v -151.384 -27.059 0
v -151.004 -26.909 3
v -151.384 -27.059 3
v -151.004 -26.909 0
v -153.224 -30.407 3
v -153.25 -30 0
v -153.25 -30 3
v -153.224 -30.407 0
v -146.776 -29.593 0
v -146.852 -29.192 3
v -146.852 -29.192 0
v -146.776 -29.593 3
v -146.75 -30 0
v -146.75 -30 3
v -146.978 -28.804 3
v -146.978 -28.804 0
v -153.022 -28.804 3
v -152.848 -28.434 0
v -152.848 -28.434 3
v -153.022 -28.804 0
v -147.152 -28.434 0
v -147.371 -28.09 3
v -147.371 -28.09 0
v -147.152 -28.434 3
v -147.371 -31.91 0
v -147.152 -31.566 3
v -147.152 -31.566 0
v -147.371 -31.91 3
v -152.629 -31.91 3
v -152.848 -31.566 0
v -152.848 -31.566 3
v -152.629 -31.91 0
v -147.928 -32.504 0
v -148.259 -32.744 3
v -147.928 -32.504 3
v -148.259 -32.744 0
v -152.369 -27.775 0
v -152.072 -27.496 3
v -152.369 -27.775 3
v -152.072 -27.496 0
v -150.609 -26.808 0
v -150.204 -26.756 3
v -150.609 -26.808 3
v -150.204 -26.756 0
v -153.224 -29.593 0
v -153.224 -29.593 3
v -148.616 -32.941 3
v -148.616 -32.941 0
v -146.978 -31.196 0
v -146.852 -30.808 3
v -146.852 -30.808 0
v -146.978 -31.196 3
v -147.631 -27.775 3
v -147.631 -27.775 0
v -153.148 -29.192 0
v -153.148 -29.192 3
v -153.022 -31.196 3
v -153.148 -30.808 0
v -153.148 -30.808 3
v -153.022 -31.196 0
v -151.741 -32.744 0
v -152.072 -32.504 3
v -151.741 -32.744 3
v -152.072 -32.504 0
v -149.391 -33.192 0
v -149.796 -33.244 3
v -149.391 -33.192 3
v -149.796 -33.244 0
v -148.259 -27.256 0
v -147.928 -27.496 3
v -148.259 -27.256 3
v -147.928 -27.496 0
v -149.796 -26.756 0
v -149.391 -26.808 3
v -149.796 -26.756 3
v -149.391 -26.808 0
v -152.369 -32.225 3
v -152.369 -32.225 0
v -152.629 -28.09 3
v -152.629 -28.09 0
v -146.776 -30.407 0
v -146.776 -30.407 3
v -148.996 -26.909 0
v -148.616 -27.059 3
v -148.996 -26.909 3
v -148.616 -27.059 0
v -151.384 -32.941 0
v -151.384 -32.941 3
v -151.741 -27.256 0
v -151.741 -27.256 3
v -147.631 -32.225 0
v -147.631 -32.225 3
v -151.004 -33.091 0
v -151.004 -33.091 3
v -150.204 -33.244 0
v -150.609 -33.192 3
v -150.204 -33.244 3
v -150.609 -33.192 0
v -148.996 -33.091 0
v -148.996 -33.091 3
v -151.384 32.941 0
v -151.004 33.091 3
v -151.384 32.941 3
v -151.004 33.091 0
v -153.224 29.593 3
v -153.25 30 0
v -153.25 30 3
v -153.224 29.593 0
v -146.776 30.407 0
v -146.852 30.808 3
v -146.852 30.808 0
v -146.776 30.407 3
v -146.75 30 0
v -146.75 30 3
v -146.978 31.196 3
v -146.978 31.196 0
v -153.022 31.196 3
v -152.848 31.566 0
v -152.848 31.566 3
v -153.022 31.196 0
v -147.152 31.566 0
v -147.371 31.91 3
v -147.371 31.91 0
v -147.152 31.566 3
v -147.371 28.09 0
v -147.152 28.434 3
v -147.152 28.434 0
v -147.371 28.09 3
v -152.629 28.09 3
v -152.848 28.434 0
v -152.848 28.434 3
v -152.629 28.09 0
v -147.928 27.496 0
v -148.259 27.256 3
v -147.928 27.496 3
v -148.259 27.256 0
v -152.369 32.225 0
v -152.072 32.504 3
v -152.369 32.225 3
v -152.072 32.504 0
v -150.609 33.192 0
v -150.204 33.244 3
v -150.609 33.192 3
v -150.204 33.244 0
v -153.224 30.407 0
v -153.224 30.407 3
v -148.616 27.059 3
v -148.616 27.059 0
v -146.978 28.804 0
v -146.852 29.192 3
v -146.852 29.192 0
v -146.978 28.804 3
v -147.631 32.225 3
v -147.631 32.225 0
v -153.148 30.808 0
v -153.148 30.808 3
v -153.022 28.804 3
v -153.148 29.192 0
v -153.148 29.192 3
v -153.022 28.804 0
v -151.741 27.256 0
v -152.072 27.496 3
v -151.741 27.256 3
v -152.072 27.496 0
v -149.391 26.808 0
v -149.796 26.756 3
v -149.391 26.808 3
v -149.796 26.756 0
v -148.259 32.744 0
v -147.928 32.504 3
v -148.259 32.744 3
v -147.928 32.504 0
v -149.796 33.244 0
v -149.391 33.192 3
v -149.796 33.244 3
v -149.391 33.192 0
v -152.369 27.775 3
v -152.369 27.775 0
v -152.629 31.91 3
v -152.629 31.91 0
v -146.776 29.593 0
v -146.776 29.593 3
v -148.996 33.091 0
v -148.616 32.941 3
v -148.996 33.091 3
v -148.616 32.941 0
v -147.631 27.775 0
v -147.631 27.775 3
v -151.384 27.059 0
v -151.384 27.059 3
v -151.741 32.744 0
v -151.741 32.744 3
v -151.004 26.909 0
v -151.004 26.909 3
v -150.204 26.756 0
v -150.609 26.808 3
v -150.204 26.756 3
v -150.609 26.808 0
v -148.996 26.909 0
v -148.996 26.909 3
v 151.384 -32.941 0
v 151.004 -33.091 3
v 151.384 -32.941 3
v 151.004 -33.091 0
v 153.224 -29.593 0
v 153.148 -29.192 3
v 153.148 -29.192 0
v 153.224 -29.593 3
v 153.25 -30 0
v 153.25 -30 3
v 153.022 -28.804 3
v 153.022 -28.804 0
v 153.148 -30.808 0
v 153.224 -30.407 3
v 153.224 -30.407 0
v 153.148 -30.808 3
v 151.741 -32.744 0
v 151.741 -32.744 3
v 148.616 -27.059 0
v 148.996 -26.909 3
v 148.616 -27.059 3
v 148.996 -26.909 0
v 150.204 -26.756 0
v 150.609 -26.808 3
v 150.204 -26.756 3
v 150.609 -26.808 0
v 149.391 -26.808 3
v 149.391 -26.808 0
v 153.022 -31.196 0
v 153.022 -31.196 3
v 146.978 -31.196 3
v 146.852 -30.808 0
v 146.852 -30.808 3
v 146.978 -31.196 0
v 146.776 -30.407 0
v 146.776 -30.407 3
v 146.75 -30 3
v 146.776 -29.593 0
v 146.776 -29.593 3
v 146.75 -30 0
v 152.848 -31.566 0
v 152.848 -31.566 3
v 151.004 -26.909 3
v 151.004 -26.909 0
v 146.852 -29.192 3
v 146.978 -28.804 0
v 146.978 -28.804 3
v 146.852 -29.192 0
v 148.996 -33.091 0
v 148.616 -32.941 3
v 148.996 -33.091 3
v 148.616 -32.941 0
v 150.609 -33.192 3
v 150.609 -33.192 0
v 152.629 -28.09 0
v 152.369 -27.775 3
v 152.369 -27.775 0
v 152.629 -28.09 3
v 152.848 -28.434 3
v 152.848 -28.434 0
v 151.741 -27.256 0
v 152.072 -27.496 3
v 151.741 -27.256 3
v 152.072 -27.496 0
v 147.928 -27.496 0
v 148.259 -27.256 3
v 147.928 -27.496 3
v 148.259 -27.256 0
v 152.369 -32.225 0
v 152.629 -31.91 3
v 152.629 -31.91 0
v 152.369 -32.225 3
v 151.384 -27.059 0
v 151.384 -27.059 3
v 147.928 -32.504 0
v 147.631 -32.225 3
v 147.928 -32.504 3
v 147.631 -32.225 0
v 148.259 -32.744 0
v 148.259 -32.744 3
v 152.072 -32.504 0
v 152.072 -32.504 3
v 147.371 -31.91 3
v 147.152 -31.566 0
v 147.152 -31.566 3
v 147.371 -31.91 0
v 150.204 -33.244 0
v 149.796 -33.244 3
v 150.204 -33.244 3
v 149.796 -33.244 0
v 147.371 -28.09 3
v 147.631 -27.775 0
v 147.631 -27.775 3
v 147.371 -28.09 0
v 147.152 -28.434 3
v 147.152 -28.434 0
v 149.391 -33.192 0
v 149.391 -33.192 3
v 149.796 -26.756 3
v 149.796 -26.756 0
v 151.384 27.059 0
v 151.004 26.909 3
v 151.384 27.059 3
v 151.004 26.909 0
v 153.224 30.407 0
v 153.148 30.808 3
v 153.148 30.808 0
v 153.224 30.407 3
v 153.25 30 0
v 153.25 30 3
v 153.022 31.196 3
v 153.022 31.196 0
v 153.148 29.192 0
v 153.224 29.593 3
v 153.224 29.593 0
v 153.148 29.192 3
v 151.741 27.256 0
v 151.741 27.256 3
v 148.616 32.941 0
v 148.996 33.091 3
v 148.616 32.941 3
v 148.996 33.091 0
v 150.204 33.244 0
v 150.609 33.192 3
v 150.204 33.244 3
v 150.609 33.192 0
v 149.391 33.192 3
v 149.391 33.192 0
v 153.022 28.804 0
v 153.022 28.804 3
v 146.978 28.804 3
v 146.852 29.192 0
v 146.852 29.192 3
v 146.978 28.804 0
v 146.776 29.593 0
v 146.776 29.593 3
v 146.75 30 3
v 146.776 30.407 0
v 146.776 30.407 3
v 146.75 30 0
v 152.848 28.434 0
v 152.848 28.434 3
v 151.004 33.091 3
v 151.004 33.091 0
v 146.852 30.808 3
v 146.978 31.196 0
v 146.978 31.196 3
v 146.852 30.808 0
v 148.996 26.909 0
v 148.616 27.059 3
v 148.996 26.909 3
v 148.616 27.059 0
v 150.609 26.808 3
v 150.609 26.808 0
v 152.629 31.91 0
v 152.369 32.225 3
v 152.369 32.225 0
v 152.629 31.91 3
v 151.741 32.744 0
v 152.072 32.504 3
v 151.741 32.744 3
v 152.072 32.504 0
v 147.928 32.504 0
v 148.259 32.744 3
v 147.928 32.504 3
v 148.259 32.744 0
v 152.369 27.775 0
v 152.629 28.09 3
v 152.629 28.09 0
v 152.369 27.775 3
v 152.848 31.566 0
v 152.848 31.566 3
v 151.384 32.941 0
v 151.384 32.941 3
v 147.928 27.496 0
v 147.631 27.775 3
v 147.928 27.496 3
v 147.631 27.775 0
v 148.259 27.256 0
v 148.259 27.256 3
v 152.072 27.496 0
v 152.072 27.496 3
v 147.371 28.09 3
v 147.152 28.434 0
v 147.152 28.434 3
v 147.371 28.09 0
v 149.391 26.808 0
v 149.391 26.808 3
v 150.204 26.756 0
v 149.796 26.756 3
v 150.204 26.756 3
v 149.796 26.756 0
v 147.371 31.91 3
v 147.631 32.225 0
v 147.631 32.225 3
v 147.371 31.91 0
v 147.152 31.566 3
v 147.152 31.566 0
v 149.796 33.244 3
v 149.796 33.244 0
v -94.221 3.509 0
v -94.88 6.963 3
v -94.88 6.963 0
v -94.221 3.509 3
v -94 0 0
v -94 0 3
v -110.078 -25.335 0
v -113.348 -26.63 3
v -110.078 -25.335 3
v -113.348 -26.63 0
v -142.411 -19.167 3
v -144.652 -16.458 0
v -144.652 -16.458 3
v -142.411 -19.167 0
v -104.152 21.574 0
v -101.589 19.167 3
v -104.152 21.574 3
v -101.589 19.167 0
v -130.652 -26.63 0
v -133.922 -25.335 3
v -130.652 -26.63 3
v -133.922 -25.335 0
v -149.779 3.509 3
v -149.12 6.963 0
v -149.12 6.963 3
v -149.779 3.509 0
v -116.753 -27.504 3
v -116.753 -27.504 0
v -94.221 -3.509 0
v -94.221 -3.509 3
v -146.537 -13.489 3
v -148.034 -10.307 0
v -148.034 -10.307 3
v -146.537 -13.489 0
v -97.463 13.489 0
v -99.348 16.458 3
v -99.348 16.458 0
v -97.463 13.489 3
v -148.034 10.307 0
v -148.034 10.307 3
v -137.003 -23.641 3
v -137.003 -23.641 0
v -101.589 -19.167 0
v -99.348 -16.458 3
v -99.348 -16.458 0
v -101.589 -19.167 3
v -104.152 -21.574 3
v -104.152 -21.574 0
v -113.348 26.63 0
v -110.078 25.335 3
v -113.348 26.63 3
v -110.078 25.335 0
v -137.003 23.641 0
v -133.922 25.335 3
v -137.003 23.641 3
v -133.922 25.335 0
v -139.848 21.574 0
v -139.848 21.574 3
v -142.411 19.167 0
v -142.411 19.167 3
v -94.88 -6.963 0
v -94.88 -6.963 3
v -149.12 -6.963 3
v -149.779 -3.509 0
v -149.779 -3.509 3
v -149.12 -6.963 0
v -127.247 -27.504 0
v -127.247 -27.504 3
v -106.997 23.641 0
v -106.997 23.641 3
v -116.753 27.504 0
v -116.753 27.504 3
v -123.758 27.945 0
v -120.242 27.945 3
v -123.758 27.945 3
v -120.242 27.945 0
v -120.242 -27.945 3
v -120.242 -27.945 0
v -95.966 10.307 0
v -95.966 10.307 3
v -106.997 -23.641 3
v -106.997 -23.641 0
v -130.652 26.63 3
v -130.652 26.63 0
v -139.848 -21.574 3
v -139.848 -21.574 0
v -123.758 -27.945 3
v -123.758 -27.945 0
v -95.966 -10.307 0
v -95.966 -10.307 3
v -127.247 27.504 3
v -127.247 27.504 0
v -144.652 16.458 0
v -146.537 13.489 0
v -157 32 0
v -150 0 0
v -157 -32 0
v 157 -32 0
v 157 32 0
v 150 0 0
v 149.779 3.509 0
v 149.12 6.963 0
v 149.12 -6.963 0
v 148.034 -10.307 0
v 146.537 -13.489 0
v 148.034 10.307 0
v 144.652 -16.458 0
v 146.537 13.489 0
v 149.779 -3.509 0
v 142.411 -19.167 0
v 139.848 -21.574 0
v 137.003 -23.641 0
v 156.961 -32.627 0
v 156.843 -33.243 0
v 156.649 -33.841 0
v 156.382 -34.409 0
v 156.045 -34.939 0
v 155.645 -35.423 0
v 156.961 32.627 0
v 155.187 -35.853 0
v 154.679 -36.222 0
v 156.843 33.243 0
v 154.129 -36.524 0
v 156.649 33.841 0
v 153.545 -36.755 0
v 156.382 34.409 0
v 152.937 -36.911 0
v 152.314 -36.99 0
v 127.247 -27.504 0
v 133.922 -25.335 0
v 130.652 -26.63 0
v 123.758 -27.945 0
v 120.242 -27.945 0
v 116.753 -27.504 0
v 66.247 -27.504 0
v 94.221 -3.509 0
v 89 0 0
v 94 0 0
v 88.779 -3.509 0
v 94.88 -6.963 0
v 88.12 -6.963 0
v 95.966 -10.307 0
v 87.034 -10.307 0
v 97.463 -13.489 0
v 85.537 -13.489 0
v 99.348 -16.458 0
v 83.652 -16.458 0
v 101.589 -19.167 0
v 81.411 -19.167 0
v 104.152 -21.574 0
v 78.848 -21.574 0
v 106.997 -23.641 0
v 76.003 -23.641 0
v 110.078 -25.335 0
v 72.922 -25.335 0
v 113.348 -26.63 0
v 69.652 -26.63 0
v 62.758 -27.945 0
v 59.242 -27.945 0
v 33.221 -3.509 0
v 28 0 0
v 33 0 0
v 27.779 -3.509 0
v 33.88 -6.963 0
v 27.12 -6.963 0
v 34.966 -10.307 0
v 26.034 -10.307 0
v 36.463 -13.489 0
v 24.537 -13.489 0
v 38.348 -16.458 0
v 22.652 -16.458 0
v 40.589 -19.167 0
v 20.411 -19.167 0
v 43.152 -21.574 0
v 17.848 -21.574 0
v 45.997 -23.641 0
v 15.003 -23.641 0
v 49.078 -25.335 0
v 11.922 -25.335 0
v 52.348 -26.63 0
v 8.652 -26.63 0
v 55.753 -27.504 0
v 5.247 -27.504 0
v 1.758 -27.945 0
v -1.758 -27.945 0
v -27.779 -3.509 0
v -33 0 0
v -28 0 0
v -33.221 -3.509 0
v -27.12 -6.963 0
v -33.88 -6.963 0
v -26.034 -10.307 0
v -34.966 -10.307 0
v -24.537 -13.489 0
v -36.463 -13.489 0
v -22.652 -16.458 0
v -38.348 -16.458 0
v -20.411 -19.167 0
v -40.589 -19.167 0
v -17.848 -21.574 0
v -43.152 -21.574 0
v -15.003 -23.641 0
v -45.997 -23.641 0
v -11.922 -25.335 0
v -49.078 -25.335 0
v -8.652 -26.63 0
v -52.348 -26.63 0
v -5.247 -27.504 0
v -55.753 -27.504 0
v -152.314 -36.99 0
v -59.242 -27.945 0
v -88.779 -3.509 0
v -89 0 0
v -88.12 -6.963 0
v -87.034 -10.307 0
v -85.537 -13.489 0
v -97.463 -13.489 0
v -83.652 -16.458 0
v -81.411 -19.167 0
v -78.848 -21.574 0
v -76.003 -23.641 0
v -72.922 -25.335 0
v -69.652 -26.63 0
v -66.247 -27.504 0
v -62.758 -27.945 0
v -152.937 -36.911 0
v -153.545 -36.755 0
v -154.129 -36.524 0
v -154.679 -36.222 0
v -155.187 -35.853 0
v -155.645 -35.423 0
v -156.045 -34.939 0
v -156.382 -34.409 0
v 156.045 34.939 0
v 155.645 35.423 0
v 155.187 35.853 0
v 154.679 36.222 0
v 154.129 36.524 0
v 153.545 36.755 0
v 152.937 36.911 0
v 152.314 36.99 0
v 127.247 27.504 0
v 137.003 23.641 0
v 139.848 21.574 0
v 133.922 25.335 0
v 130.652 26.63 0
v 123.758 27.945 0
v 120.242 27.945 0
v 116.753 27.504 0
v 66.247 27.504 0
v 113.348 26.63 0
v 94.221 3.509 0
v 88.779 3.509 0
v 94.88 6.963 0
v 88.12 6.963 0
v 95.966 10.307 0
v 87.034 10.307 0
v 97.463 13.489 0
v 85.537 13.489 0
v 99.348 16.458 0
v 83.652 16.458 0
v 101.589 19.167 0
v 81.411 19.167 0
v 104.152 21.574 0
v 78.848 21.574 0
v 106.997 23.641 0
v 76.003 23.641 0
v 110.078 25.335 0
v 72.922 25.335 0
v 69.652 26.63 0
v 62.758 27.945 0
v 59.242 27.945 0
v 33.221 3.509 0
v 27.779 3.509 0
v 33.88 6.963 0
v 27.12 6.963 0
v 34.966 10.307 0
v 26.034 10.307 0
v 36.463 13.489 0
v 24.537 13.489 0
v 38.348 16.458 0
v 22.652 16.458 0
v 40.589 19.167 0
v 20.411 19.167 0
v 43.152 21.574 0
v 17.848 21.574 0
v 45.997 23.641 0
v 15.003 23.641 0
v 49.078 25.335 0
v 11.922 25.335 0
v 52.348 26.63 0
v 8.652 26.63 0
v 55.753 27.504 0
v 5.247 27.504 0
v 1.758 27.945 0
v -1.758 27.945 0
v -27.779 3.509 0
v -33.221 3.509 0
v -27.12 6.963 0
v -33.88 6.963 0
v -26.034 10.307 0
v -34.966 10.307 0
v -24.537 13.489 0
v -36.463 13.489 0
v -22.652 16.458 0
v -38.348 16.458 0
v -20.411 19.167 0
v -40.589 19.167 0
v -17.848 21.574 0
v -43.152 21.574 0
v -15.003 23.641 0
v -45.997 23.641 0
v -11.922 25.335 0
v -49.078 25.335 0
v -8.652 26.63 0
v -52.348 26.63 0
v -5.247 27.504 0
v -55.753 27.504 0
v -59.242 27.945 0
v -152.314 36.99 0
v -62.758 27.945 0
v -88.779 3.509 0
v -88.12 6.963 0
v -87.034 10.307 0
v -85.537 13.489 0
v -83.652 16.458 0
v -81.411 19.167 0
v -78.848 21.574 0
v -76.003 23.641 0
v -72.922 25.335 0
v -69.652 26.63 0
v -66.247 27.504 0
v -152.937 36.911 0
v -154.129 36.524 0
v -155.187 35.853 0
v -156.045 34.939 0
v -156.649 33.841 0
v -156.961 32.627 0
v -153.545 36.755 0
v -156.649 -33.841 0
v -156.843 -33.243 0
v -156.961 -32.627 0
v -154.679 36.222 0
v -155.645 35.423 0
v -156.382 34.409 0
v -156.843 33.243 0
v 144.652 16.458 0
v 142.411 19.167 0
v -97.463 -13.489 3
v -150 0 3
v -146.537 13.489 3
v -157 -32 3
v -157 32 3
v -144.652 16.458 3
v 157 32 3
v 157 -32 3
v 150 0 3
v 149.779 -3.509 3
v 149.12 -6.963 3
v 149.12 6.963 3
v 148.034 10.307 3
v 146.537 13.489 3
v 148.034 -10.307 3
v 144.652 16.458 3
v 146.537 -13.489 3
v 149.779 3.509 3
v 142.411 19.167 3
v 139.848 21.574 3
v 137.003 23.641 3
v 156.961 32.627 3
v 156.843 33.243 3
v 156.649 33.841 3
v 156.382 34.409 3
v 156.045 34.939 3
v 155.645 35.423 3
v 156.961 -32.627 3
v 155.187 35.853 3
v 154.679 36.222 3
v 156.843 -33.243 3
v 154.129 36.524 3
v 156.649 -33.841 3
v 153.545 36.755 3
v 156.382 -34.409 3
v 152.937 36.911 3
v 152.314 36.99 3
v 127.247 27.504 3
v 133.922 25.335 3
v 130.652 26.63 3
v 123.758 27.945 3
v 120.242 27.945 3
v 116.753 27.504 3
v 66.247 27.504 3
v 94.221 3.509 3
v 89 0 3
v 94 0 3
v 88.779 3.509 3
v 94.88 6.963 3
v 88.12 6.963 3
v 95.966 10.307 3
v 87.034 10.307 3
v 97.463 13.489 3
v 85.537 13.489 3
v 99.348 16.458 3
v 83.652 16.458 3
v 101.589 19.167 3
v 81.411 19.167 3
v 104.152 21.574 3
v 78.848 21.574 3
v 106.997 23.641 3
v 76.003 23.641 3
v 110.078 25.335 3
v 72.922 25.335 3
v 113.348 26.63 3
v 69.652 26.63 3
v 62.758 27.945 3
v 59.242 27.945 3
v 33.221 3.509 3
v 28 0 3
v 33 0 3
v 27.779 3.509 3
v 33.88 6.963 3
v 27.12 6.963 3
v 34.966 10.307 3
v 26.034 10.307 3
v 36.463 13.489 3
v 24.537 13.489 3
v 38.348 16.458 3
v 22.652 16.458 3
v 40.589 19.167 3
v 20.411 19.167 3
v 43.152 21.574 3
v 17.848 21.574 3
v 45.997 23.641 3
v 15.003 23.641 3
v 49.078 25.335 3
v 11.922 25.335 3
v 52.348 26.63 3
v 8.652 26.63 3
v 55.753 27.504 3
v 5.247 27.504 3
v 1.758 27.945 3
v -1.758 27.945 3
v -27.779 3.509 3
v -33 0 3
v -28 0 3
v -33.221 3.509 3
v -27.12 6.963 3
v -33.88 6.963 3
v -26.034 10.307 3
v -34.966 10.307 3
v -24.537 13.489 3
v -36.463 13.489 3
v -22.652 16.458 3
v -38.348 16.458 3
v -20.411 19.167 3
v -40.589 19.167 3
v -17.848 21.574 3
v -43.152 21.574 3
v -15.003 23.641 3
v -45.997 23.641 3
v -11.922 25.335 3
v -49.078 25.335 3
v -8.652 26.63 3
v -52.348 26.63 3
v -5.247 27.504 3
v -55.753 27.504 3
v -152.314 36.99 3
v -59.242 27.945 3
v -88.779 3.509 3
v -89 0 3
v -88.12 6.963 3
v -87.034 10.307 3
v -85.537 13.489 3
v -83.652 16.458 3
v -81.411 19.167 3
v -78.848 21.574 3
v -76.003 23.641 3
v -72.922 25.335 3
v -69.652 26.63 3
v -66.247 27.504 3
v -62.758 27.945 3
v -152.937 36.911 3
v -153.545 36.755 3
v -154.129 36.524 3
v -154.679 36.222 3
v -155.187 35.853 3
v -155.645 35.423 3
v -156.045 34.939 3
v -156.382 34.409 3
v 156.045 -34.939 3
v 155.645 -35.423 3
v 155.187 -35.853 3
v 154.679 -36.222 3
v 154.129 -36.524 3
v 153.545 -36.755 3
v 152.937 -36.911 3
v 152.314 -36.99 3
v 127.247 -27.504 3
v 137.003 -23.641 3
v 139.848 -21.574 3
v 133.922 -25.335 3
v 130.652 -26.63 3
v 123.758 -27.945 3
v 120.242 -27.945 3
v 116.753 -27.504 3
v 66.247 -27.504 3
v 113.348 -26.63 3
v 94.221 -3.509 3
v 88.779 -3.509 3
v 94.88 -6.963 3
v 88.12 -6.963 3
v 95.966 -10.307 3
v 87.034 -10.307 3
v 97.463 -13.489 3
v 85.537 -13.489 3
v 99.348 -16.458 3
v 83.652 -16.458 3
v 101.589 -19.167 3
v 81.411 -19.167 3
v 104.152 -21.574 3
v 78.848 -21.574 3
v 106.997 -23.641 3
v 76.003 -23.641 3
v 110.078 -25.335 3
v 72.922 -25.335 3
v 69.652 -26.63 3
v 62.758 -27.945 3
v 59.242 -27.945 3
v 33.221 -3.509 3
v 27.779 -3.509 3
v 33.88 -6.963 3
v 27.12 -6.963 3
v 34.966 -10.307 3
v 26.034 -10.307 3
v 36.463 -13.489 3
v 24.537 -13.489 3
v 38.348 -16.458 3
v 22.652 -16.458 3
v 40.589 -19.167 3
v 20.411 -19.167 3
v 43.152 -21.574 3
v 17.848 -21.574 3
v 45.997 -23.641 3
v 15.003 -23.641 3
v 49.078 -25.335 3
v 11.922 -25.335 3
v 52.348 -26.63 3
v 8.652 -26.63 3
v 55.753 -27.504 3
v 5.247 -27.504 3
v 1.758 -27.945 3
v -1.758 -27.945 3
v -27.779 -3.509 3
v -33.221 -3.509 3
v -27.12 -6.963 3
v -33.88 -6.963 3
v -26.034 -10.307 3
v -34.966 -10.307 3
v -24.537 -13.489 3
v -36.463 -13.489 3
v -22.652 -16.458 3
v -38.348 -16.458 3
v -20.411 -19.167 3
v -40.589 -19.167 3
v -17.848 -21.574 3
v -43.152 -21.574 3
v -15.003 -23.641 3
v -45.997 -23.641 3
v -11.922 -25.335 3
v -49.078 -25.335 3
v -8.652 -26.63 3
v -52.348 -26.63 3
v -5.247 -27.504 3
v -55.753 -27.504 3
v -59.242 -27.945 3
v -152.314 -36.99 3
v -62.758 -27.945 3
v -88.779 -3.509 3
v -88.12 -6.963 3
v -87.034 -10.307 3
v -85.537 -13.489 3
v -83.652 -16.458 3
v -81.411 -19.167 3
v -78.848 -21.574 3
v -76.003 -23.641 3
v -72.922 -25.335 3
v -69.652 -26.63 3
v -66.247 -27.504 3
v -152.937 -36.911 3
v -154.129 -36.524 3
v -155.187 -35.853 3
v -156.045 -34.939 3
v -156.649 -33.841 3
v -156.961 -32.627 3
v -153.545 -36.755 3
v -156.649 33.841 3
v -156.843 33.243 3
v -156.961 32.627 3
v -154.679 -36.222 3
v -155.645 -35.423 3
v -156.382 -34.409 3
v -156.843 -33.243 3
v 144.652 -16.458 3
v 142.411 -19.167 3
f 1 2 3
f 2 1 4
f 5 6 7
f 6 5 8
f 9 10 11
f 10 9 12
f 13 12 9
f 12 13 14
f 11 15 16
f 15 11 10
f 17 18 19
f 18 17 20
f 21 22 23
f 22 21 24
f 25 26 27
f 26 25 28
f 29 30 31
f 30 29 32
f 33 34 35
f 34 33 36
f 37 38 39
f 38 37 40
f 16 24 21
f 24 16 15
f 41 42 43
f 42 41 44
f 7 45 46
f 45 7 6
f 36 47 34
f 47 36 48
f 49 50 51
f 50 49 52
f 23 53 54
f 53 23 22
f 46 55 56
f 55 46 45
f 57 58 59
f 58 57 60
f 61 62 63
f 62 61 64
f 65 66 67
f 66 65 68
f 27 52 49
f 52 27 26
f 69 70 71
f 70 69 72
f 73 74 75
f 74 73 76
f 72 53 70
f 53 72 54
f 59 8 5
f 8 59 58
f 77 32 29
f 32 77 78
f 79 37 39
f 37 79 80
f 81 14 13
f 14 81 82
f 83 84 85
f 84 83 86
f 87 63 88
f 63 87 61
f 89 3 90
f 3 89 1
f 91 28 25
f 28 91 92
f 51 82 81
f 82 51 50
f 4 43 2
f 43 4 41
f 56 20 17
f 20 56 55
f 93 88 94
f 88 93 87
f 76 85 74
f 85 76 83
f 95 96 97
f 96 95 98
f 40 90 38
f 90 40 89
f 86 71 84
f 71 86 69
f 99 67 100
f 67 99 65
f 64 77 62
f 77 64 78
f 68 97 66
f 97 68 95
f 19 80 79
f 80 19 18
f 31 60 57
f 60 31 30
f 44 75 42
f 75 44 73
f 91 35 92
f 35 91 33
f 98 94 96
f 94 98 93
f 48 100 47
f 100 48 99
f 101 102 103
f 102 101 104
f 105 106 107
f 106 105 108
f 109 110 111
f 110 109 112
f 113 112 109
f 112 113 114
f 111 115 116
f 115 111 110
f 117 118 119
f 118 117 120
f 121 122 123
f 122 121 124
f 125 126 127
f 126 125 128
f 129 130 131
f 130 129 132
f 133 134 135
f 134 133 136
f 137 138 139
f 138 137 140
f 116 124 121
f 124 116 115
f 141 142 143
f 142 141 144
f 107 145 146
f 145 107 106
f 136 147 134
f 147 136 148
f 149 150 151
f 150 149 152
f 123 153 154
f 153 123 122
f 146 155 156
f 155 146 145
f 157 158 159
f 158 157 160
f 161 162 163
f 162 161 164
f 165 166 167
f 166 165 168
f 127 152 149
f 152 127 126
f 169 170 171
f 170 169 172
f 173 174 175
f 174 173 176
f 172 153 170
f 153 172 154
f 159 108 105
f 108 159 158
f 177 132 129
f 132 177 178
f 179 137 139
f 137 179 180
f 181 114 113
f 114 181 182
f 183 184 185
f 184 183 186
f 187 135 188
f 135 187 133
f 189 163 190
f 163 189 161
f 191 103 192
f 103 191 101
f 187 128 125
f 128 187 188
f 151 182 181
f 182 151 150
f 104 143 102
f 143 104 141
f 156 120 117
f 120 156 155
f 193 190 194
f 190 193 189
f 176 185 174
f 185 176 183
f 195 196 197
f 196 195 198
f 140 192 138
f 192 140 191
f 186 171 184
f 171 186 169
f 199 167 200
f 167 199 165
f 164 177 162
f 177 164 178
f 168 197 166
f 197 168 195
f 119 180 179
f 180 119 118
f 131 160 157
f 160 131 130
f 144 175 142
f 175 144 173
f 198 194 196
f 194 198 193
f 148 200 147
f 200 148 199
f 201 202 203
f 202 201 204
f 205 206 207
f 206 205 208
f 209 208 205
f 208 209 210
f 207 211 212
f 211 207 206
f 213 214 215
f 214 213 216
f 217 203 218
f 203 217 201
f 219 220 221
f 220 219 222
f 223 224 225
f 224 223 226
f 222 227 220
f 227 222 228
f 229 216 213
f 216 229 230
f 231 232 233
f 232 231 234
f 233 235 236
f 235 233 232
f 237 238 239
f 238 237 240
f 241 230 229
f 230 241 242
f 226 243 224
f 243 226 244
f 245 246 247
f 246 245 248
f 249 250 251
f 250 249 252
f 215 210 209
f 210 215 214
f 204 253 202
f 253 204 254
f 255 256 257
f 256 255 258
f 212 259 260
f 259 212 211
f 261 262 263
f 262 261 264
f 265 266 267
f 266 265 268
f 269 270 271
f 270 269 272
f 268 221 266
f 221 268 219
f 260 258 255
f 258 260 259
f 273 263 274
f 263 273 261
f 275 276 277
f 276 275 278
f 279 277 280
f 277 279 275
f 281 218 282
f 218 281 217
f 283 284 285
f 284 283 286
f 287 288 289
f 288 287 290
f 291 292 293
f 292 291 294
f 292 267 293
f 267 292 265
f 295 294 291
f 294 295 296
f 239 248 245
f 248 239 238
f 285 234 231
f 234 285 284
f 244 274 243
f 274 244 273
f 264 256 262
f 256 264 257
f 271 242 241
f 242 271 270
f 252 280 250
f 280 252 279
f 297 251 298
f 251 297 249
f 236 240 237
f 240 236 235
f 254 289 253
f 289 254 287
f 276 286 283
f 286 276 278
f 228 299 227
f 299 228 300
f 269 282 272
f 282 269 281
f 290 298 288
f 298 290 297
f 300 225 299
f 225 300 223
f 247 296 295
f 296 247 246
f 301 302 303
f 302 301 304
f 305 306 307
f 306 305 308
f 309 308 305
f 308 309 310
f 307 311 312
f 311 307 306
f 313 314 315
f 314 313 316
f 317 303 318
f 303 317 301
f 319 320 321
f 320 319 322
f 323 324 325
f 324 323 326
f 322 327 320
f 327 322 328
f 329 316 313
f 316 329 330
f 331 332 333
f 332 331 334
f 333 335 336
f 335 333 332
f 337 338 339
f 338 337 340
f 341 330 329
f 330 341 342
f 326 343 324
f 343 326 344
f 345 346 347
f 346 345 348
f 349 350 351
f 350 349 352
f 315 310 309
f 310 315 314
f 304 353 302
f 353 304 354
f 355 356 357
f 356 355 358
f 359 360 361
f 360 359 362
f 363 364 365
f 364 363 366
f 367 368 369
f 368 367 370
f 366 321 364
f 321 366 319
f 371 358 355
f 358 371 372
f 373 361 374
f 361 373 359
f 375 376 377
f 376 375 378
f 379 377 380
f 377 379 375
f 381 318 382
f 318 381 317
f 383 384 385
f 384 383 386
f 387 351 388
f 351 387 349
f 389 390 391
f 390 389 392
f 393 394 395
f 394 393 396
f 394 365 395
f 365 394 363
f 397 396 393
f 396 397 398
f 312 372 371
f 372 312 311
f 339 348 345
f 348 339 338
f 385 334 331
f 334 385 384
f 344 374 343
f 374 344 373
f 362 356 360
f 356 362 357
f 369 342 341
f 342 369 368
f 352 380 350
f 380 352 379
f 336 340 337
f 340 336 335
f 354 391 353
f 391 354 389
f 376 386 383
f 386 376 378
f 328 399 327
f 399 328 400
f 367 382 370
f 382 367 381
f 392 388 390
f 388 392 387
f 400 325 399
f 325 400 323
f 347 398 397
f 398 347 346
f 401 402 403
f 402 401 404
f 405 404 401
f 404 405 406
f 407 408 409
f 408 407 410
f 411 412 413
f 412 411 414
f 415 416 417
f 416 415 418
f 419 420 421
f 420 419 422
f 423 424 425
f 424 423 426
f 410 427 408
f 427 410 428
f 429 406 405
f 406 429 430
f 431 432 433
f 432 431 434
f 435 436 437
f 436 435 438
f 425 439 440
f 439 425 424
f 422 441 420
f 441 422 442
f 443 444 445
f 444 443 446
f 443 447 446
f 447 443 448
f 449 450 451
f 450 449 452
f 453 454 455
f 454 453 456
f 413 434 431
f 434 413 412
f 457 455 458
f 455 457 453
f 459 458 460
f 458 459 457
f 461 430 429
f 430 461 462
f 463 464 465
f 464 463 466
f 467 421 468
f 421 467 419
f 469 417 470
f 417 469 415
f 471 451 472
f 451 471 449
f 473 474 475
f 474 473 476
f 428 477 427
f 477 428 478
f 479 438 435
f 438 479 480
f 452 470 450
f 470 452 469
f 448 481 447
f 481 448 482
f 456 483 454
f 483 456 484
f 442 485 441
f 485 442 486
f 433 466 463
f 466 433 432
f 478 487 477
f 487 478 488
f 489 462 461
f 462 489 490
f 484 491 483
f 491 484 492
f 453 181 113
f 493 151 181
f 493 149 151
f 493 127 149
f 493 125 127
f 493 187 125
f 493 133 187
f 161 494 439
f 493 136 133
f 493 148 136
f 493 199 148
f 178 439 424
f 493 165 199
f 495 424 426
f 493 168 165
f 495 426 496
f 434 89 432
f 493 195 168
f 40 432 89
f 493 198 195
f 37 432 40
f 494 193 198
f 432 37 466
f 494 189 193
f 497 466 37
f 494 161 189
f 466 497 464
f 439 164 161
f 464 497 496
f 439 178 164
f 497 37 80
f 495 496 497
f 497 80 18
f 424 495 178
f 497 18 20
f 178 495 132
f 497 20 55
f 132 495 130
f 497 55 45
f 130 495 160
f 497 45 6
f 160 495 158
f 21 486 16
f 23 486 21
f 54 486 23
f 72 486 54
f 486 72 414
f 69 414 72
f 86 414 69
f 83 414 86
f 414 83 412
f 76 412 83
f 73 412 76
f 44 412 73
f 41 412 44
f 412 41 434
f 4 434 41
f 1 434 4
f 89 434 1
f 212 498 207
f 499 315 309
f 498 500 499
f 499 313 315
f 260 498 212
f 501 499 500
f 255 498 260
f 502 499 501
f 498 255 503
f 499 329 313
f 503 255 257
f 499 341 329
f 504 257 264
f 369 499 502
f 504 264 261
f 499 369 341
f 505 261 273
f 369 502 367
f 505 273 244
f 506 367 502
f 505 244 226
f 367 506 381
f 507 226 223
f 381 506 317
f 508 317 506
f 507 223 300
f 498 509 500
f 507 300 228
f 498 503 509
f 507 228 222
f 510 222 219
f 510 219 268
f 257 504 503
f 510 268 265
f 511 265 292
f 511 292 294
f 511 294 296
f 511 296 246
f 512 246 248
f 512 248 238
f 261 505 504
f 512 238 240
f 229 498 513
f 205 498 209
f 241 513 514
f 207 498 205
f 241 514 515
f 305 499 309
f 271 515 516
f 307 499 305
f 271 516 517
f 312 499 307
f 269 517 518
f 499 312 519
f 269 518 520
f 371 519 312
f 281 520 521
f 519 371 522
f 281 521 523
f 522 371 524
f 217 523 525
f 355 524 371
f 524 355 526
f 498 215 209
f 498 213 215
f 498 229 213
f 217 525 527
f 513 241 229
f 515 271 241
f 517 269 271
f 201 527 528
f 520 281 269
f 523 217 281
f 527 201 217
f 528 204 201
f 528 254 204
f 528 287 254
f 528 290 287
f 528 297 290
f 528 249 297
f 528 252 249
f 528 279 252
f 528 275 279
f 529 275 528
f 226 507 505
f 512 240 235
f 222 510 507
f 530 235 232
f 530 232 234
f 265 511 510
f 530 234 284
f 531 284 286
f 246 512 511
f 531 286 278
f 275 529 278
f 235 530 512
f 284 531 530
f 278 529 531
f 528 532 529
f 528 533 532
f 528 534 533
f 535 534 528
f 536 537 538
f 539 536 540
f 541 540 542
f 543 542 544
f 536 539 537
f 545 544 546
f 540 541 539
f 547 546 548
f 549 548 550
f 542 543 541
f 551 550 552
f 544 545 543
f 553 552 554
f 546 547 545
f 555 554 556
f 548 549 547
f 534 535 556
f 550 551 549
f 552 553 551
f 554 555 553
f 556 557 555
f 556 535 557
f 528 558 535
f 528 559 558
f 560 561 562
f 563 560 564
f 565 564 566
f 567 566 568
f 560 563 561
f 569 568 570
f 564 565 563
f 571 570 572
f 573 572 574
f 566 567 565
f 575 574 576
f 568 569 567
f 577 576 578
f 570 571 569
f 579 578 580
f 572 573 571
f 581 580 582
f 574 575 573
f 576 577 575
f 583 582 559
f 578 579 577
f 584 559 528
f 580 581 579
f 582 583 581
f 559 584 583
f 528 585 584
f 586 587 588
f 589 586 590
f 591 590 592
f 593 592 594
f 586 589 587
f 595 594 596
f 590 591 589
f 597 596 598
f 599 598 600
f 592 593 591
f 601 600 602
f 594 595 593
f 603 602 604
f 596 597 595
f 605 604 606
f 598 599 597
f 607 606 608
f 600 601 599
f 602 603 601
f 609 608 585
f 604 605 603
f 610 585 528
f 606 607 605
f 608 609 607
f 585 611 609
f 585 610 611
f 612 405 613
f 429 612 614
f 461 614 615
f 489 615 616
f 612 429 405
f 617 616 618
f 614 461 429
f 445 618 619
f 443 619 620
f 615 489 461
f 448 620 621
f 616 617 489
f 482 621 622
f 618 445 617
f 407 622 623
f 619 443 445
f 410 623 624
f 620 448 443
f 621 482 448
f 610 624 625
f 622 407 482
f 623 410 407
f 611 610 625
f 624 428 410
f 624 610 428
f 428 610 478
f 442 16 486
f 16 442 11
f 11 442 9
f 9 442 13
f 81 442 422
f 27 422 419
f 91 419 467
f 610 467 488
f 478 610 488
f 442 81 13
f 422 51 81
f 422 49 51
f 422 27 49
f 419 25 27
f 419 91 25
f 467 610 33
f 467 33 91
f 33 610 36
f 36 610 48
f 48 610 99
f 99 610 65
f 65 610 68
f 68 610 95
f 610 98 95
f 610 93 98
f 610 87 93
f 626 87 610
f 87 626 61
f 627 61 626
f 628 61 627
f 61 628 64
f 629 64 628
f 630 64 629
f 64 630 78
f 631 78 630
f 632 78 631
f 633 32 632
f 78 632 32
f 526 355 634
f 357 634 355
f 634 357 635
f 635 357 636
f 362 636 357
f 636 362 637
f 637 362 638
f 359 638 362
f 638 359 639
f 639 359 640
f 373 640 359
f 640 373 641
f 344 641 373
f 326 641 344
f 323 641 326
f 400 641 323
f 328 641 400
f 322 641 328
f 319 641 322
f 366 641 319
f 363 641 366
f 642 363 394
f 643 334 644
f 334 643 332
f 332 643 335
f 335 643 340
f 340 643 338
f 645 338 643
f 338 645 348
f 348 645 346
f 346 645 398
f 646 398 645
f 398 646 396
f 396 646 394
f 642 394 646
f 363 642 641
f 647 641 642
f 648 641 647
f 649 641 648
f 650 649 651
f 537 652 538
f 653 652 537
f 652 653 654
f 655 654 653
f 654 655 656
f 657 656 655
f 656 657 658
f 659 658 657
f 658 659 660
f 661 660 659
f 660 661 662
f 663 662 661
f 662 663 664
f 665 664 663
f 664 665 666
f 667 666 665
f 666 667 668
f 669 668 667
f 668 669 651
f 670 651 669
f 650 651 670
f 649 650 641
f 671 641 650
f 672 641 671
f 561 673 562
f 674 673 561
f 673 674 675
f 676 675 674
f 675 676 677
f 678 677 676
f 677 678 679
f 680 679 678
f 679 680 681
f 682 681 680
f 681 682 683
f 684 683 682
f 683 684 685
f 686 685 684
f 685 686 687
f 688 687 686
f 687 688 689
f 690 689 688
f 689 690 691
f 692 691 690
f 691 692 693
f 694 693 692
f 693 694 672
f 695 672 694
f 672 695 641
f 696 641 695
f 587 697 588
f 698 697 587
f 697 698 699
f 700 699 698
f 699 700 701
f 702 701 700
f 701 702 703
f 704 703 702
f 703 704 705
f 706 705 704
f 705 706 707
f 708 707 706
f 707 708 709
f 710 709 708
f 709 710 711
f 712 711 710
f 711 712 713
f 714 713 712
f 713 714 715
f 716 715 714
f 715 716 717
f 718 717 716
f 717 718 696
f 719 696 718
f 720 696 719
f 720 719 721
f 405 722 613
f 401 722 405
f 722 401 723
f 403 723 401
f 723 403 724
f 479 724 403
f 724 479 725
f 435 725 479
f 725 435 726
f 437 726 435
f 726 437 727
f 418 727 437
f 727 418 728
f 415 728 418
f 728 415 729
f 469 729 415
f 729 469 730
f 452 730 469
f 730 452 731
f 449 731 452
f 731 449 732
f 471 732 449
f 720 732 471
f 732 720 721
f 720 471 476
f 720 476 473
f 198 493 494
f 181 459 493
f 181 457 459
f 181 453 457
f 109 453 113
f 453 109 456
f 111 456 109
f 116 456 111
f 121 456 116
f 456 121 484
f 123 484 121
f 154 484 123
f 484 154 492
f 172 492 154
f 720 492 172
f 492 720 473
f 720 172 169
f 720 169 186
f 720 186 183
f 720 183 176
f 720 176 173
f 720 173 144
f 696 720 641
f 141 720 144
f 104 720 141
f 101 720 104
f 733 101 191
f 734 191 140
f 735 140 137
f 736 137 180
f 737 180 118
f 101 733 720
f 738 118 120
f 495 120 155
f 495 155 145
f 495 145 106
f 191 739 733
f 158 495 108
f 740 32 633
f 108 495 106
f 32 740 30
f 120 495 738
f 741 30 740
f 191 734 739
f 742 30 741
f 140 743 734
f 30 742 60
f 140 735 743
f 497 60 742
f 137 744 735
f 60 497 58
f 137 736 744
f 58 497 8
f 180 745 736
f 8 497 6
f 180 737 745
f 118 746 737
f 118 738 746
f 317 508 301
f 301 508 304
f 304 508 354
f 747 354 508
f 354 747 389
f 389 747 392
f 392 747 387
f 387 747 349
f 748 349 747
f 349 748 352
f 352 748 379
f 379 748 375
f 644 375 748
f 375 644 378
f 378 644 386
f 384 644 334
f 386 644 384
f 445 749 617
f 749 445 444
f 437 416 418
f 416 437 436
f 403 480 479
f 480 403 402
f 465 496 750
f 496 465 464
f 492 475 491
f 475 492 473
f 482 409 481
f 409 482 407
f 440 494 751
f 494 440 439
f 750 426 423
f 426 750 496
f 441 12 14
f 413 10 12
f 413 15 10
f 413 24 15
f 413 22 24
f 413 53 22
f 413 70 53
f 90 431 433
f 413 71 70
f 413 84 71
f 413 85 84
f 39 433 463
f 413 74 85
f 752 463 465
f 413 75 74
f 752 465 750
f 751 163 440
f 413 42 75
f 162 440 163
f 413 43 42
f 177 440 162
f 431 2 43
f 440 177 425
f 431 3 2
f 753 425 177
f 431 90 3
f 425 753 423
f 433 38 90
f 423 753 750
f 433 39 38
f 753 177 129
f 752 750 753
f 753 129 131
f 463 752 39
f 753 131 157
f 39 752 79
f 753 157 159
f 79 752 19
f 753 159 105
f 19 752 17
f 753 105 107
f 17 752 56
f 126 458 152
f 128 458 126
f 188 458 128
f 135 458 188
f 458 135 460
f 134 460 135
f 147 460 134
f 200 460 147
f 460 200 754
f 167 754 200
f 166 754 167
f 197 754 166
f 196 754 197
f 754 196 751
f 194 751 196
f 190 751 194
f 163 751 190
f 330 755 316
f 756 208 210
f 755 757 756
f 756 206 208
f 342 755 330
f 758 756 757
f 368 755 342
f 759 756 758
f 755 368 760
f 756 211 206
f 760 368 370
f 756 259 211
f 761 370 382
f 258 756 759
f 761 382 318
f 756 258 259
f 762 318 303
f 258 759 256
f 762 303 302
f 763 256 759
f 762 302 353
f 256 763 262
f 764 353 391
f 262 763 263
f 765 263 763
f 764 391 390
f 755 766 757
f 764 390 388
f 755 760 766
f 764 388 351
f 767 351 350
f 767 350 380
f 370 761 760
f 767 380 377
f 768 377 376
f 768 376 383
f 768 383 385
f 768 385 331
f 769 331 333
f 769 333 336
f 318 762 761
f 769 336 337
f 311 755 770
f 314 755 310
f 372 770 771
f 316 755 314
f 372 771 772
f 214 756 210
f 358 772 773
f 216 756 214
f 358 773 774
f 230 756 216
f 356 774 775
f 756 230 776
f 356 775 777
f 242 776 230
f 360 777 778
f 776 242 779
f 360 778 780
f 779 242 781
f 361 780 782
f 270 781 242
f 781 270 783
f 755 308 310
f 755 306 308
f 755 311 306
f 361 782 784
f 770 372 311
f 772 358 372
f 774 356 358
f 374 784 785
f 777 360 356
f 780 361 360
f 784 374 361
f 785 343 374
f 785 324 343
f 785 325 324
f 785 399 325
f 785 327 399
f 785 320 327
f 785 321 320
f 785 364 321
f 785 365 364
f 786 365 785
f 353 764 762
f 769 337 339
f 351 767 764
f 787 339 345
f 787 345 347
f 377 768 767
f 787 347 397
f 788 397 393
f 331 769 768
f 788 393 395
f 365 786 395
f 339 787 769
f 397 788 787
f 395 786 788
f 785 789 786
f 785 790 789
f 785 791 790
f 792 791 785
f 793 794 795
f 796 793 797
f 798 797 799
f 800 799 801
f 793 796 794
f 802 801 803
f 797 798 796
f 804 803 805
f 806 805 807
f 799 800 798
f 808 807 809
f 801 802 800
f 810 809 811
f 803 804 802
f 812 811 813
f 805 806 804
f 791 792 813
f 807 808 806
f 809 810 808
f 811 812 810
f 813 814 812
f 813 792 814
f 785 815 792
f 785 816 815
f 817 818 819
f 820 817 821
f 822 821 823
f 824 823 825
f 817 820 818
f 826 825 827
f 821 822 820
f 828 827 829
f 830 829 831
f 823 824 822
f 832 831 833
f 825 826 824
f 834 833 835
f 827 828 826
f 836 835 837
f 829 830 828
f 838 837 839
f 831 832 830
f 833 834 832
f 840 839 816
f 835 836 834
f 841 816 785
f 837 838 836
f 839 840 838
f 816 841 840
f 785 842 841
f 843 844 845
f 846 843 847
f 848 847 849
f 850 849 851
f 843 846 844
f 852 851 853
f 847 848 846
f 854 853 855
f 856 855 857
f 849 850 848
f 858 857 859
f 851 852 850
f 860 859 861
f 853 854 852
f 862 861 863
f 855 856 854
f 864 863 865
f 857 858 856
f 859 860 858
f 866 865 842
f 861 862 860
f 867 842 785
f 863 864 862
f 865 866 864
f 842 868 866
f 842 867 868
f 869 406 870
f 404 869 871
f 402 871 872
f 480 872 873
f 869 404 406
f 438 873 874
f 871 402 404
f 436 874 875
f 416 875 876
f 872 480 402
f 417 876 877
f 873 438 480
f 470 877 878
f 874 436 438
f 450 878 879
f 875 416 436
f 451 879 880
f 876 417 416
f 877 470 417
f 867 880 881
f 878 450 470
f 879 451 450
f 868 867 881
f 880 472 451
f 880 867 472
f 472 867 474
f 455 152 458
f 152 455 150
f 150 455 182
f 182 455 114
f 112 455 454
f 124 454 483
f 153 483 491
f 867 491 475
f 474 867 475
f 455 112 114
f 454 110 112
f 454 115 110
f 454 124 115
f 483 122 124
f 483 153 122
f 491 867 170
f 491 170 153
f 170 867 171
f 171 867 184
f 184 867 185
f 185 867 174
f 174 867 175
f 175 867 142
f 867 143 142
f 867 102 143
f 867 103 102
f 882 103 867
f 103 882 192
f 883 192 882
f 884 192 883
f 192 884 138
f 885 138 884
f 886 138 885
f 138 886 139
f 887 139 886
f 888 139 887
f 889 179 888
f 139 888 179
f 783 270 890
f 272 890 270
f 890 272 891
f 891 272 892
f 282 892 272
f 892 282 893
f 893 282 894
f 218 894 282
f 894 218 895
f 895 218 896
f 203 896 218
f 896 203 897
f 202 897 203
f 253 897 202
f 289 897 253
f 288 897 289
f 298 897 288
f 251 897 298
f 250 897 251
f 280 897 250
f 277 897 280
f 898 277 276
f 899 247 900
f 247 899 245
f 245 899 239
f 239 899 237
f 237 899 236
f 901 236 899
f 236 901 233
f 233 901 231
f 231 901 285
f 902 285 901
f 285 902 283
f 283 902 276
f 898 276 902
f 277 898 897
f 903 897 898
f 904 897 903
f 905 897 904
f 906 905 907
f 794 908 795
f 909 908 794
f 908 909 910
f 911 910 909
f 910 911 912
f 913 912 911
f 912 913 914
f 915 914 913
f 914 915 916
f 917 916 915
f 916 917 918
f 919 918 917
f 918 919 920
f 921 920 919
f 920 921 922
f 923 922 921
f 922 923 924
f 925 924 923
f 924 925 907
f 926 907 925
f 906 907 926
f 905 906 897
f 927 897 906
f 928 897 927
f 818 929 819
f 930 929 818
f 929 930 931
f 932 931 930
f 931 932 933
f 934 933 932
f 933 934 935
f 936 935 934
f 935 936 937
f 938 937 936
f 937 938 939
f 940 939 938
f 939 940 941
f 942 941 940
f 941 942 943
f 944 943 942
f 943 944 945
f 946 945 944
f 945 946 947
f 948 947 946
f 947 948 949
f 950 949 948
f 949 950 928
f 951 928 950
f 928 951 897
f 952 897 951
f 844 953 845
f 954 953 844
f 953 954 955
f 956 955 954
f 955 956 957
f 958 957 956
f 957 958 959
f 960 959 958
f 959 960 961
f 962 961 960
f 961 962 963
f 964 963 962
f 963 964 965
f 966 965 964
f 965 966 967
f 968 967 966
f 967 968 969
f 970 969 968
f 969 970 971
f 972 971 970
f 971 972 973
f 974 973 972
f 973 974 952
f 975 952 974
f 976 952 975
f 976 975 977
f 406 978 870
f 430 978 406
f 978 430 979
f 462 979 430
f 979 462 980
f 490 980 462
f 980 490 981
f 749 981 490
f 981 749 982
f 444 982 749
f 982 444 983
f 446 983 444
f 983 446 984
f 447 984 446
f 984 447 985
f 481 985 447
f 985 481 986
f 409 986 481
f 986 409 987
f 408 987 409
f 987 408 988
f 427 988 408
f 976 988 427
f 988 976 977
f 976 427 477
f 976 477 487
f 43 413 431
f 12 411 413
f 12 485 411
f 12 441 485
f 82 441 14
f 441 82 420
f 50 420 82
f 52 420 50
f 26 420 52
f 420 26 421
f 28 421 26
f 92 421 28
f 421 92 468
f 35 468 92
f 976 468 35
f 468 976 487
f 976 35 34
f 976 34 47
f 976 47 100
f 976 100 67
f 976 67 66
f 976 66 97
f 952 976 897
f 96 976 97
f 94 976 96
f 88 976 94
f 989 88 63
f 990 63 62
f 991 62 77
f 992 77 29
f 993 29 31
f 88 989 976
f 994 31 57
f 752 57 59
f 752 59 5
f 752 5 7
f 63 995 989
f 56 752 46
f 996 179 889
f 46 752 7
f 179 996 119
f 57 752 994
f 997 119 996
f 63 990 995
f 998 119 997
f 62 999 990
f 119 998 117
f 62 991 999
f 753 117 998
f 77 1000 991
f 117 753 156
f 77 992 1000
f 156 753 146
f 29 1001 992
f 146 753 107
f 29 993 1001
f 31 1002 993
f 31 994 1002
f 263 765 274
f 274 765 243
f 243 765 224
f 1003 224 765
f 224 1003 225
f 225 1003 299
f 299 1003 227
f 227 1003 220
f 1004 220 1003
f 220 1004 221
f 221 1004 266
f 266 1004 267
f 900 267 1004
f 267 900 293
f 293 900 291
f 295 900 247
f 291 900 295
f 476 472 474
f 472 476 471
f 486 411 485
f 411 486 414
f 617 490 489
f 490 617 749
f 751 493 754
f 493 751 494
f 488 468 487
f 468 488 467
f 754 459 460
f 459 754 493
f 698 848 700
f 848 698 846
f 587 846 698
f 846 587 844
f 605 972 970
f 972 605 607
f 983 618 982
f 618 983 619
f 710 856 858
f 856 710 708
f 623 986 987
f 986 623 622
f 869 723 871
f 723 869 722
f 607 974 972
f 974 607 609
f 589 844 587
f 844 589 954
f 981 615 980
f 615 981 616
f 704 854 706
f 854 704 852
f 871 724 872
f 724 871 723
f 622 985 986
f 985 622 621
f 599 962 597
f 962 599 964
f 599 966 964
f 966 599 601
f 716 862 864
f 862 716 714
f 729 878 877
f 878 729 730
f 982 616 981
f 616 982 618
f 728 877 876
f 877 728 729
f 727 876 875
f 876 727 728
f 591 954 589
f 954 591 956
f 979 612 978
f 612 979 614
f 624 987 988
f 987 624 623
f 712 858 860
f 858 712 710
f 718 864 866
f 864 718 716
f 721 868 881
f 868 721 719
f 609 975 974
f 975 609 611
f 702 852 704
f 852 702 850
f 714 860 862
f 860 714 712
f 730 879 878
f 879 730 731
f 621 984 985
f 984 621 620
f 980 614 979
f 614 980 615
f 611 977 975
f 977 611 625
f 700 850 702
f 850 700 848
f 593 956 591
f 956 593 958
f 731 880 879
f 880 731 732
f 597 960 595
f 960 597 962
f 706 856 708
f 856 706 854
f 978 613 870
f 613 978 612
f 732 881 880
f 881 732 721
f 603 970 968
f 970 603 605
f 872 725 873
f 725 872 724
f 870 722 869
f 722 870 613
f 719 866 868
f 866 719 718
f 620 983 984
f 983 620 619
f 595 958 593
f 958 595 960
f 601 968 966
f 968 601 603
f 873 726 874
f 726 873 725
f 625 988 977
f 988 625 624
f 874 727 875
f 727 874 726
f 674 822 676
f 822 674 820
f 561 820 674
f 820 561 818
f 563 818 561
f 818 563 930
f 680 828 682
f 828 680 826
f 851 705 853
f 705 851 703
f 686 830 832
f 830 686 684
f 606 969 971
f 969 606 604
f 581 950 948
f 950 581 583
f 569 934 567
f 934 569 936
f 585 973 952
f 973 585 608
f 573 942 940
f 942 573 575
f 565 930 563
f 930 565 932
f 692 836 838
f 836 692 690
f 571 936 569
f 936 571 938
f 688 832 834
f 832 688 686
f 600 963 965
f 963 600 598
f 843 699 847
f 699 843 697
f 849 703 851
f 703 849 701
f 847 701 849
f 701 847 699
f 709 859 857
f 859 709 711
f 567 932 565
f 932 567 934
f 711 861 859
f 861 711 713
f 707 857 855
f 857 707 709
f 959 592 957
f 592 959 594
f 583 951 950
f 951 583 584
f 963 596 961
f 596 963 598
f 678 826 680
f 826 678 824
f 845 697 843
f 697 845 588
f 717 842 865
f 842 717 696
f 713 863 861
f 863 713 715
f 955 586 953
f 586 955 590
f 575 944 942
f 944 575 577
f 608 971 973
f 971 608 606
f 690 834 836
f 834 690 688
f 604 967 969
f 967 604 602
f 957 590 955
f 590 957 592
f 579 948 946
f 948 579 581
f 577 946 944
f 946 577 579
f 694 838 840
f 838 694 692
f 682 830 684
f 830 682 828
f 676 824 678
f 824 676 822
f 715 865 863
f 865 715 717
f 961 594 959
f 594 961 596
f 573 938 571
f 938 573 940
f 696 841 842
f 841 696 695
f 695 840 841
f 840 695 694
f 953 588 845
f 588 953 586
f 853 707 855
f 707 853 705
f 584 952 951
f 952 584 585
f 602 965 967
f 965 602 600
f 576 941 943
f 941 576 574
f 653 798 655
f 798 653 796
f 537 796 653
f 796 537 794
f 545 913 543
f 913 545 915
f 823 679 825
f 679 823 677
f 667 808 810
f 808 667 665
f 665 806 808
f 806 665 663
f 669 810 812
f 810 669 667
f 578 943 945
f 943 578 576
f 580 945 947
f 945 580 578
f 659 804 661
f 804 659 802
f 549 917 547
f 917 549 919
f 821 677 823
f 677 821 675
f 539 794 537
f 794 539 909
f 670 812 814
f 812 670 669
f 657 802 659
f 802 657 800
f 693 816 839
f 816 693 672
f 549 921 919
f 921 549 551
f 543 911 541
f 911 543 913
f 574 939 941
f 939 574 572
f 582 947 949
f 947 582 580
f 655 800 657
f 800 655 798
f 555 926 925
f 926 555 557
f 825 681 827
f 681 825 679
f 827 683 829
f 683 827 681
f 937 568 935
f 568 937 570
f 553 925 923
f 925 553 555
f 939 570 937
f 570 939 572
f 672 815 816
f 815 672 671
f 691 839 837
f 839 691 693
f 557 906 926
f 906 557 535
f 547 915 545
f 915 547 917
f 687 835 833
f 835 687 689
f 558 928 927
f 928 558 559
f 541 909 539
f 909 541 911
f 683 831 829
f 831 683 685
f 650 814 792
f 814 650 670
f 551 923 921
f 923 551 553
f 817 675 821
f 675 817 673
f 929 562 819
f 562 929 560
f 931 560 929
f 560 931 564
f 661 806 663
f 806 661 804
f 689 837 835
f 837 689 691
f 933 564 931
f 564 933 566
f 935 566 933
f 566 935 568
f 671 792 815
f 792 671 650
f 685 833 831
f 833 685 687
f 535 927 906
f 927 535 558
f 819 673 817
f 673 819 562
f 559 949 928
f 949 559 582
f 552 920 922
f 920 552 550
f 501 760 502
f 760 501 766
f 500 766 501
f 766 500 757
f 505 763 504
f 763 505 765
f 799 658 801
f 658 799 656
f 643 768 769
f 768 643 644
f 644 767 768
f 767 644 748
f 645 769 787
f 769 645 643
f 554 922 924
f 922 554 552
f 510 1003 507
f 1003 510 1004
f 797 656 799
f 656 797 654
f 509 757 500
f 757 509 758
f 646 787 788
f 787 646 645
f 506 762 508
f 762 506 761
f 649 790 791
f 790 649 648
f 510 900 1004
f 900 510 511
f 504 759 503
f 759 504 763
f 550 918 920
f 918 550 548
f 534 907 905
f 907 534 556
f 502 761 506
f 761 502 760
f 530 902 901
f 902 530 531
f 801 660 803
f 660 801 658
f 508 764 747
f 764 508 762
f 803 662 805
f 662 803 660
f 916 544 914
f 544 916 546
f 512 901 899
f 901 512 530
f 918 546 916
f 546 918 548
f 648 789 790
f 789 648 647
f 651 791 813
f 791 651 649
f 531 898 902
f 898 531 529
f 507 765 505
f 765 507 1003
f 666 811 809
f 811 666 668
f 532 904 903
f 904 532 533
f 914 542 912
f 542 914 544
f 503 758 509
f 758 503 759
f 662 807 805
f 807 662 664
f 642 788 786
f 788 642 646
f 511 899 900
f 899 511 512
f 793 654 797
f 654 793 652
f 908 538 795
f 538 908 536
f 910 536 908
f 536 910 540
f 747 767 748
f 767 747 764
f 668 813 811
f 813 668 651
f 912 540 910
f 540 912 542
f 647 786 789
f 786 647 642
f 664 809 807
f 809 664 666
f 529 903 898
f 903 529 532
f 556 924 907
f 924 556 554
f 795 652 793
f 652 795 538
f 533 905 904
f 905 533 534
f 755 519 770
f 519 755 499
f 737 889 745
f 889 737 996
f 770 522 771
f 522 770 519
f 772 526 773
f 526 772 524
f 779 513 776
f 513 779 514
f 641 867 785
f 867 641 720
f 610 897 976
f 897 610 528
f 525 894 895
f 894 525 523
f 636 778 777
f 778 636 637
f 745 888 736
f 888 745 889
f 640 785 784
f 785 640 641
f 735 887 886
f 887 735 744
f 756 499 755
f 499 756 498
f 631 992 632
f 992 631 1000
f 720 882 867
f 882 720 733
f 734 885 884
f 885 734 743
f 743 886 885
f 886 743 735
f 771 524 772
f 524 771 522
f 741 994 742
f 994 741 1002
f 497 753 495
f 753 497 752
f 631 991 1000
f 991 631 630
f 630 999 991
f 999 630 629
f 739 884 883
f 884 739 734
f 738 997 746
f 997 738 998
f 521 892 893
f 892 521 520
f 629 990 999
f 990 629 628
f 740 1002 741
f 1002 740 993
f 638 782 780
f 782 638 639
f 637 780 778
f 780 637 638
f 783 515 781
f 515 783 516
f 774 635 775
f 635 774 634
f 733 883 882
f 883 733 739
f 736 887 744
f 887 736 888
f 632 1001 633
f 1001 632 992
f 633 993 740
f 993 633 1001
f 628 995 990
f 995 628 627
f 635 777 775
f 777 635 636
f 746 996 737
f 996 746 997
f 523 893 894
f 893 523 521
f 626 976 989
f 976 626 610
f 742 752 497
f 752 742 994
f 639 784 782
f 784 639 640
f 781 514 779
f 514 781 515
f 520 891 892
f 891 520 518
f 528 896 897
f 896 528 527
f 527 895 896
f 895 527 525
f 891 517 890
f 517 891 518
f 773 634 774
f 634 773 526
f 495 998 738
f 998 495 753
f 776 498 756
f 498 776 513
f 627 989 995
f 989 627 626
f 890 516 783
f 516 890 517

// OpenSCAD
$fn = 50;


difference() {
	union() {
		hull() {
			translate(v = [-152.0000000000, 32.0000000000, 0]) {
				cylinder(h = 3, r = 5);
			}
			translate(v = [152.0000000000, 32.0000000000, 0]) {
				cylinder(h = 3, r = 5);
			}
			translate(v = [-152.0000000000, -32.0000000000, 0]) {
				cylinder(h = 3, r = 5);
			}
			translate(v = [152.0000000000, -32.0000000000, 0]) {
				cylinder(h = 3, r = 5);
			}
		}
	}
	union() {
		#translate(v = [-150.0000000000, -30.0000000000, -100.0000000000]) {
			cylinder(h = 200, r = 3.2500000000);
		}
		#translate(v = [-150.0000000000, 30.0000000000, -100.0000000000]) {
			cylinder(h = 200, r = 3.2500000000);
		}
		#translate(v = [150.0000000000, -30.0000000000, -100.0000000000]) {
			cylinder(h = 200, r = 3.2500000000);
		}
		#translate(v = [150.0000000000, 30.0000000000, -100.0000000000]) {
			cylinder(h = 200, r = 3.2500000000);
		}
		#translate(v = [-122.0000000000, 0, 0]) {
			cylinder(h = 3, r = 28.0000000000);
		}
		#translate(v = [-61.0000000000, 0, 0]) {
			cylinder(h = 3, r = 28.0000000000);
		}
		#cylinder(h = 3, r = 28.0000000000);
		#translate(v = [61.0000000000, 0, 0]) {
			cylinder(h = 3, r = 28.0000000000);
		}
		#translate(v = [122.0000000000, 0, 0]) {
			cylinder(h = 3, r = 28.0000000000);
		}
	}
}
